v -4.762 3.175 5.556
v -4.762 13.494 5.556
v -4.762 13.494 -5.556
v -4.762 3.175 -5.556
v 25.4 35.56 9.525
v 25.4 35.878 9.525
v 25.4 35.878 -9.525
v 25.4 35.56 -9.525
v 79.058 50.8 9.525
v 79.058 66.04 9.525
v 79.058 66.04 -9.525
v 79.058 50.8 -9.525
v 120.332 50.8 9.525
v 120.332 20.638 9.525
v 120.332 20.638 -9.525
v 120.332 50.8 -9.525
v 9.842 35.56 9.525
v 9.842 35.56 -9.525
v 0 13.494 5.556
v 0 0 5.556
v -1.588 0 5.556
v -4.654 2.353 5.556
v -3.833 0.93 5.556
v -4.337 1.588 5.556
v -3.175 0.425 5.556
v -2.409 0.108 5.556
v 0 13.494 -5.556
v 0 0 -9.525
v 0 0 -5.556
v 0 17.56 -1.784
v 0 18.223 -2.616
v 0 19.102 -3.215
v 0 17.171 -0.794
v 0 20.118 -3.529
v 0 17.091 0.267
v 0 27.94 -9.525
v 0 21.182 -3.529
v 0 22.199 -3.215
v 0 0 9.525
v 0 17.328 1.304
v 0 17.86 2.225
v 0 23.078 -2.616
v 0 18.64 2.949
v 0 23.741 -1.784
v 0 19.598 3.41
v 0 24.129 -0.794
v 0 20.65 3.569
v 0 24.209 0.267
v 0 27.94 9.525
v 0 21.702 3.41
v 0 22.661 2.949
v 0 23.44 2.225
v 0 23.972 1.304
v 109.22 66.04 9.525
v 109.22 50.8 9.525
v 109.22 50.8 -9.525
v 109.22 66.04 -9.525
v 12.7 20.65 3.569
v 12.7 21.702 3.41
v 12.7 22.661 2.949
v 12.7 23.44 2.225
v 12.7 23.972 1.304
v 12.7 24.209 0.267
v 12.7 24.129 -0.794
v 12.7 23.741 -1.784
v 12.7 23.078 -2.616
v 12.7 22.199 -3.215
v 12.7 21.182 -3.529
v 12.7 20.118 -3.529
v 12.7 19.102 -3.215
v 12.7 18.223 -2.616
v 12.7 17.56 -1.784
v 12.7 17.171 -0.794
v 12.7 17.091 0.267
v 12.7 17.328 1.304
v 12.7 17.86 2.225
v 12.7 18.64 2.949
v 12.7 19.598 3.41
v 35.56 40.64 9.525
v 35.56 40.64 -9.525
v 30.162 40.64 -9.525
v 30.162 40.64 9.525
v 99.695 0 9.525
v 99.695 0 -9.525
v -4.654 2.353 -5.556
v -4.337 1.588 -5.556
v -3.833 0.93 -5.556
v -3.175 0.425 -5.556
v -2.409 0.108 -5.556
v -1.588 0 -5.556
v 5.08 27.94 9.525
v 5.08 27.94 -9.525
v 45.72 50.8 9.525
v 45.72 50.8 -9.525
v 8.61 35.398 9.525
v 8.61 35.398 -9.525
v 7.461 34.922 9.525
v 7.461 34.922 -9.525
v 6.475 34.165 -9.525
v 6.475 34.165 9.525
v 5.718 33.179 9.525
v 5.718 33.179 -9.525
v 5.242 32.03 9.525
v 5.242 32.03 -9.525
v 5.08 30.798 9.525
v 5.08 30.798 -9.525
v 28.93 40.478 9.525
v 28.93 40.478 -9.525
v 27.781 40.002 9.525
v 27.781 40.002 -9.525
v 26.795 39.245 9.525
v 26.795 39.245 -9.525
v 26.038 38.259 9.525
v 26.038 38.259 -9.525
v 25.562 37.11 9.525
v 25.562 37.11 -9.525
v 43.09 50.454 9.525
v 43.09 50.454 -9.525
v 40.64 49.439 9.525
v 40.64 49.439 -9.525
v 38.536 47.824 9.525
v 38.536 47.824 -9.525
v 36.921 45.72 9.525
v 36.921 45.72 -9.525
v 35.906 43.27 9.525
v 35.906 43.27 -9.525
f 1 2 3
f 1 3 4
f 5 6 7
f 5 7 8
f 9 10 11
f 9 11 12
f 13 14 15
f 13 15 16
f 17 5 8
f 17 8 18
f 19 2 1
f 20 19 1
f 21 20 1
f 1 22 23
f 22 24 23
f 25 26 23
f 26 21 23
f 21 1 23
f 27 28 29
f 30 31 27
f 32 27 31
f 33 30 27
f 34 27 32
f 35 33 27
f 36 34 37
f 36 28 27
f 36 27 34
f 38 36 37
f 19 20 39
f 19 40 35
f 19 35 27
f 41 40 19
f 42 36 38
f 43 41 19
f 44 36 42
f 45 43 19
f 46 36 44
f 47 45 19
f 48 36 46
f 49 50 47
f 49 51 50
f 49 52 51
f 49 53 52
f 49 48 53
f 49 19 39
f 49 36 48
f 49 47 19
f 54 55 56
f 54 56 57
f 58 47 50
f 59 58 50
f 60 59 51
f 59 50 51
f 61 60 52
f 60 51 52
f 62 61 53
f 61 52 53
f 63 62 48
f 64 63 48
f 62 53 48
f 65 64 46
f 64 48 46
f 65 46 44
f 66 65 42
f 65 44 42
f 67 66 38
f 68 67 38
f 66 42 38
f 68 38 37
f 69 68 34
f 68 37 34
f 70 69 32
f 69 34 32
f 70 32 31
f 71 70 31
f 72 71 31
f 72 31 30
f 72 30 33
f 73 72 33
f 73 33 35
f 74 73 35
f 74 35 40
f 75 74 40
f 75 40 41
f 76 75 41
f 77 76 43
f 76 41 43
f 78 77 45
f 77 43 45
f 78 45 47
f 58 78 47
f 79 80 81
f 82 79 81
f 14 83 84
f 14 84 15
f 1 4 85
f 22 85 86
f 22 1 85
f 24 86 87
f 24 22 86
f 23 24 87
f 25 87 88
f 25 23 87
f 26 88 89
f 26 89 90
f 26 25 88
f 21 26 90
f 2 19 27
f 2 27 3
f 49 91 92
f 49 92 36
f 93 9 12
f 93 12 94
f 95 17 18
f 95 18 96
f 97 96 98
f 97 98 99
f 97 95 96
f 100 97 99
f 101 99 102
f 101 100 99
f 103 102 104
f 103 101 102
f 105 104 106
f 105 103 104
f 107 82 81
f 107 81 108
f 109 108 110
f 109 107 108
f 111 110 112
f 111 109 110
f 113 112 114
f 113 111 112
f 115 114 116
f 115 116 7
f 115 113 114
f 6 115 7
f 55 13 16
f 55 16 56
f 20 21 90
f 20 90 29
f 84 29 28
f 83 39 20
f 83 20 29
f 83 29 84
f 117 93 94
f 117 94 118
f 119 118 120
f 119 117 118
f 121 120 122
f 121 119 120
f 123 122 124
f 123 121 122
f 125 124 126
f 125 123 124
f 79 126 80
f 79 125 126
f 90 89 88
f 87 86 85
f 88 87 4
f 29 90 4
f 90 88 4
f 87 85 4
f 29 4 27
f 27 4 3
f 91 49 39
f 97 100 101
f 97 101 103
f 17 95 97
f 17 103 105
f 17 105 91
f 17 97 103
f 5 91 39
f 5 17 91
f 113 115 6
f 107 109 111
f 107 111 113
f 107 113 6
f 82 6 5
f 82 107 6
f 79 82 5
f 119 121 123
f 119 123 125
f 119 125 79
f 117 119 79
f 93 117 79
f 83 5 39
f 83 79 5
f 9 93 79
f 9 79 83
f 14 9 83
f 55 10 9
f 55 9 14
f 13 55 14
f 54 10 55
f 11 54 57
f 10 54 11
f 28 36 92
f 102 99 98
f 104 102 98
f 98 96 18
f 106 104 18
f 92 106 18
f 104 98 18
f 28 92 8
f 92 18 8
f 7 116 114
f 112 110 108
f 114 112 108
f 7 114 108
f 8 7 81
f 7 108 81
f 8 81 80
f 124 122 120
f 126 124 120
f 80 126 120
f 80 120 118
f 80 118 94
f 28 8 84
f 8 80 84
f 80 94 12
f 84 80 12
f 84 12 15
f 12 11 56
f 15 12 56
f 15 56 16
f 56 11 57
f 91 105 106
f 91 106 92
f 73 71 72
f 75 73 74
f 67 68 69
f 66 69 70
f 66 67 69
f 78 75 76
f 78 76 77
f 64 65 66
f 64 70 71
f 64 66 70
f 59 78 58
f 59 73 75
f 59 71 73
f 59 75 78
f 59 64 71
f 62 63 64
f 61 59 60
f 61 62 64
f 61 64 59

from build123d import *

# Parameters (mm, degrees)
EXTRUDE1_DEPTH      = 9.525
EXTRUDE1_DEPTH_BACK = 9.525
SKETCH3_R           = 3.5687
EXTRUDE2_DEPTH      = 12.7
CUT_EXTRUDE1_DEPTH  = 4.7625


with BuildPart() as part:
    # Sketch1 → Extrude1 (new, two sides)
    with BuildSketch(Plane.XY) as extrude1_sk:
        with BuildLine():
            Line((-1.5875, 0), (99.695, 0))
            Line((99.695, 0), (120.3325, 20.6375))
            Line((120.3325, 20.6375), (120.3325, 50.8))
            Line((120.3325, 50.8), (109.22, 50.8))
            Line((109.22, 50.8), (109.22, 66.04))
            Line((109.22, 66.04), (79.0575, 66.04))
            Line((79.0575, 66.04), (79.0575, 50.8))
            Line((79.0575, 50.8), (45.72, 50.8))
            ThreePointArc((45.72, 50.8), (38.535795103, 47.824204897), (35.56, 40.64))
            Line((35.56, 40.64), (30.1625, 40.64))
            ThreePointArc((30.1625, 40.64), (26.794903955, 39.245096045), (25.4, 35.8775))
            Line((25.4, 35.8775), (25.4, 35.56))
            Line((25.4, 35.56), (9.8425, 35.56))
            ThreePointArc((9.8425, 35.56), (6.474903955, 34.165096045), (5.08, 30.7975))
            Line((5.08, 30.7975), (5.08, 27.94))
            Line((5.08, 27.94), (0, 27.94))
            Line((0, 27.94), (0, 13.49375))
            Line((0, 13.49375), (-4.7625, 13.49375))
            Line((-4.7625, 13.49375), (-4.7625, 3.175))
            ThreePointArc((-4.7625, 3.175), (-3.83256403, 0.92993597), (-1.5875, 0))
        make_face()
    extrude(amount=EXTRUDE1_DEPTH)
    extrude(extrude1_sk.sketch, amount=-EXTRUDE1_DEPTH_BACK)


with BuildPart() as body_2:
    # Sketch3 → Extrude2 (new body)
    with BuildSketch(Plane.ZY):
        with Locations((0, 20.6502)):
            Circle(SKETCH3_R)
    extrude(amount=-EXTRUDE2_DEPTH)


with BuildPart() as part_1:
    add(part.part)

    # Combine1: cut body 2
    add(body_2.part, mode=Mode.SUBTRACT)

    # Sketch4 → Cut-Extrude1 (cut)
    with BuildSketch(Plane.ZY.offset(4.7625)):
        Polygon((-9.525, 20.0025), (-9.525, 0), (-5.55625, 0), (-5.55625, 16.03375), align=None)
        Polygon((5.55625, 0), (9.525, 0), (9.525, 20.0025), (5.55625, 16.03375), align=None)
    extrude(amount=-CUT_EXTRUDE1_DEPTH, mode=Mode.SUBTRACT)


solid = part_1.part
